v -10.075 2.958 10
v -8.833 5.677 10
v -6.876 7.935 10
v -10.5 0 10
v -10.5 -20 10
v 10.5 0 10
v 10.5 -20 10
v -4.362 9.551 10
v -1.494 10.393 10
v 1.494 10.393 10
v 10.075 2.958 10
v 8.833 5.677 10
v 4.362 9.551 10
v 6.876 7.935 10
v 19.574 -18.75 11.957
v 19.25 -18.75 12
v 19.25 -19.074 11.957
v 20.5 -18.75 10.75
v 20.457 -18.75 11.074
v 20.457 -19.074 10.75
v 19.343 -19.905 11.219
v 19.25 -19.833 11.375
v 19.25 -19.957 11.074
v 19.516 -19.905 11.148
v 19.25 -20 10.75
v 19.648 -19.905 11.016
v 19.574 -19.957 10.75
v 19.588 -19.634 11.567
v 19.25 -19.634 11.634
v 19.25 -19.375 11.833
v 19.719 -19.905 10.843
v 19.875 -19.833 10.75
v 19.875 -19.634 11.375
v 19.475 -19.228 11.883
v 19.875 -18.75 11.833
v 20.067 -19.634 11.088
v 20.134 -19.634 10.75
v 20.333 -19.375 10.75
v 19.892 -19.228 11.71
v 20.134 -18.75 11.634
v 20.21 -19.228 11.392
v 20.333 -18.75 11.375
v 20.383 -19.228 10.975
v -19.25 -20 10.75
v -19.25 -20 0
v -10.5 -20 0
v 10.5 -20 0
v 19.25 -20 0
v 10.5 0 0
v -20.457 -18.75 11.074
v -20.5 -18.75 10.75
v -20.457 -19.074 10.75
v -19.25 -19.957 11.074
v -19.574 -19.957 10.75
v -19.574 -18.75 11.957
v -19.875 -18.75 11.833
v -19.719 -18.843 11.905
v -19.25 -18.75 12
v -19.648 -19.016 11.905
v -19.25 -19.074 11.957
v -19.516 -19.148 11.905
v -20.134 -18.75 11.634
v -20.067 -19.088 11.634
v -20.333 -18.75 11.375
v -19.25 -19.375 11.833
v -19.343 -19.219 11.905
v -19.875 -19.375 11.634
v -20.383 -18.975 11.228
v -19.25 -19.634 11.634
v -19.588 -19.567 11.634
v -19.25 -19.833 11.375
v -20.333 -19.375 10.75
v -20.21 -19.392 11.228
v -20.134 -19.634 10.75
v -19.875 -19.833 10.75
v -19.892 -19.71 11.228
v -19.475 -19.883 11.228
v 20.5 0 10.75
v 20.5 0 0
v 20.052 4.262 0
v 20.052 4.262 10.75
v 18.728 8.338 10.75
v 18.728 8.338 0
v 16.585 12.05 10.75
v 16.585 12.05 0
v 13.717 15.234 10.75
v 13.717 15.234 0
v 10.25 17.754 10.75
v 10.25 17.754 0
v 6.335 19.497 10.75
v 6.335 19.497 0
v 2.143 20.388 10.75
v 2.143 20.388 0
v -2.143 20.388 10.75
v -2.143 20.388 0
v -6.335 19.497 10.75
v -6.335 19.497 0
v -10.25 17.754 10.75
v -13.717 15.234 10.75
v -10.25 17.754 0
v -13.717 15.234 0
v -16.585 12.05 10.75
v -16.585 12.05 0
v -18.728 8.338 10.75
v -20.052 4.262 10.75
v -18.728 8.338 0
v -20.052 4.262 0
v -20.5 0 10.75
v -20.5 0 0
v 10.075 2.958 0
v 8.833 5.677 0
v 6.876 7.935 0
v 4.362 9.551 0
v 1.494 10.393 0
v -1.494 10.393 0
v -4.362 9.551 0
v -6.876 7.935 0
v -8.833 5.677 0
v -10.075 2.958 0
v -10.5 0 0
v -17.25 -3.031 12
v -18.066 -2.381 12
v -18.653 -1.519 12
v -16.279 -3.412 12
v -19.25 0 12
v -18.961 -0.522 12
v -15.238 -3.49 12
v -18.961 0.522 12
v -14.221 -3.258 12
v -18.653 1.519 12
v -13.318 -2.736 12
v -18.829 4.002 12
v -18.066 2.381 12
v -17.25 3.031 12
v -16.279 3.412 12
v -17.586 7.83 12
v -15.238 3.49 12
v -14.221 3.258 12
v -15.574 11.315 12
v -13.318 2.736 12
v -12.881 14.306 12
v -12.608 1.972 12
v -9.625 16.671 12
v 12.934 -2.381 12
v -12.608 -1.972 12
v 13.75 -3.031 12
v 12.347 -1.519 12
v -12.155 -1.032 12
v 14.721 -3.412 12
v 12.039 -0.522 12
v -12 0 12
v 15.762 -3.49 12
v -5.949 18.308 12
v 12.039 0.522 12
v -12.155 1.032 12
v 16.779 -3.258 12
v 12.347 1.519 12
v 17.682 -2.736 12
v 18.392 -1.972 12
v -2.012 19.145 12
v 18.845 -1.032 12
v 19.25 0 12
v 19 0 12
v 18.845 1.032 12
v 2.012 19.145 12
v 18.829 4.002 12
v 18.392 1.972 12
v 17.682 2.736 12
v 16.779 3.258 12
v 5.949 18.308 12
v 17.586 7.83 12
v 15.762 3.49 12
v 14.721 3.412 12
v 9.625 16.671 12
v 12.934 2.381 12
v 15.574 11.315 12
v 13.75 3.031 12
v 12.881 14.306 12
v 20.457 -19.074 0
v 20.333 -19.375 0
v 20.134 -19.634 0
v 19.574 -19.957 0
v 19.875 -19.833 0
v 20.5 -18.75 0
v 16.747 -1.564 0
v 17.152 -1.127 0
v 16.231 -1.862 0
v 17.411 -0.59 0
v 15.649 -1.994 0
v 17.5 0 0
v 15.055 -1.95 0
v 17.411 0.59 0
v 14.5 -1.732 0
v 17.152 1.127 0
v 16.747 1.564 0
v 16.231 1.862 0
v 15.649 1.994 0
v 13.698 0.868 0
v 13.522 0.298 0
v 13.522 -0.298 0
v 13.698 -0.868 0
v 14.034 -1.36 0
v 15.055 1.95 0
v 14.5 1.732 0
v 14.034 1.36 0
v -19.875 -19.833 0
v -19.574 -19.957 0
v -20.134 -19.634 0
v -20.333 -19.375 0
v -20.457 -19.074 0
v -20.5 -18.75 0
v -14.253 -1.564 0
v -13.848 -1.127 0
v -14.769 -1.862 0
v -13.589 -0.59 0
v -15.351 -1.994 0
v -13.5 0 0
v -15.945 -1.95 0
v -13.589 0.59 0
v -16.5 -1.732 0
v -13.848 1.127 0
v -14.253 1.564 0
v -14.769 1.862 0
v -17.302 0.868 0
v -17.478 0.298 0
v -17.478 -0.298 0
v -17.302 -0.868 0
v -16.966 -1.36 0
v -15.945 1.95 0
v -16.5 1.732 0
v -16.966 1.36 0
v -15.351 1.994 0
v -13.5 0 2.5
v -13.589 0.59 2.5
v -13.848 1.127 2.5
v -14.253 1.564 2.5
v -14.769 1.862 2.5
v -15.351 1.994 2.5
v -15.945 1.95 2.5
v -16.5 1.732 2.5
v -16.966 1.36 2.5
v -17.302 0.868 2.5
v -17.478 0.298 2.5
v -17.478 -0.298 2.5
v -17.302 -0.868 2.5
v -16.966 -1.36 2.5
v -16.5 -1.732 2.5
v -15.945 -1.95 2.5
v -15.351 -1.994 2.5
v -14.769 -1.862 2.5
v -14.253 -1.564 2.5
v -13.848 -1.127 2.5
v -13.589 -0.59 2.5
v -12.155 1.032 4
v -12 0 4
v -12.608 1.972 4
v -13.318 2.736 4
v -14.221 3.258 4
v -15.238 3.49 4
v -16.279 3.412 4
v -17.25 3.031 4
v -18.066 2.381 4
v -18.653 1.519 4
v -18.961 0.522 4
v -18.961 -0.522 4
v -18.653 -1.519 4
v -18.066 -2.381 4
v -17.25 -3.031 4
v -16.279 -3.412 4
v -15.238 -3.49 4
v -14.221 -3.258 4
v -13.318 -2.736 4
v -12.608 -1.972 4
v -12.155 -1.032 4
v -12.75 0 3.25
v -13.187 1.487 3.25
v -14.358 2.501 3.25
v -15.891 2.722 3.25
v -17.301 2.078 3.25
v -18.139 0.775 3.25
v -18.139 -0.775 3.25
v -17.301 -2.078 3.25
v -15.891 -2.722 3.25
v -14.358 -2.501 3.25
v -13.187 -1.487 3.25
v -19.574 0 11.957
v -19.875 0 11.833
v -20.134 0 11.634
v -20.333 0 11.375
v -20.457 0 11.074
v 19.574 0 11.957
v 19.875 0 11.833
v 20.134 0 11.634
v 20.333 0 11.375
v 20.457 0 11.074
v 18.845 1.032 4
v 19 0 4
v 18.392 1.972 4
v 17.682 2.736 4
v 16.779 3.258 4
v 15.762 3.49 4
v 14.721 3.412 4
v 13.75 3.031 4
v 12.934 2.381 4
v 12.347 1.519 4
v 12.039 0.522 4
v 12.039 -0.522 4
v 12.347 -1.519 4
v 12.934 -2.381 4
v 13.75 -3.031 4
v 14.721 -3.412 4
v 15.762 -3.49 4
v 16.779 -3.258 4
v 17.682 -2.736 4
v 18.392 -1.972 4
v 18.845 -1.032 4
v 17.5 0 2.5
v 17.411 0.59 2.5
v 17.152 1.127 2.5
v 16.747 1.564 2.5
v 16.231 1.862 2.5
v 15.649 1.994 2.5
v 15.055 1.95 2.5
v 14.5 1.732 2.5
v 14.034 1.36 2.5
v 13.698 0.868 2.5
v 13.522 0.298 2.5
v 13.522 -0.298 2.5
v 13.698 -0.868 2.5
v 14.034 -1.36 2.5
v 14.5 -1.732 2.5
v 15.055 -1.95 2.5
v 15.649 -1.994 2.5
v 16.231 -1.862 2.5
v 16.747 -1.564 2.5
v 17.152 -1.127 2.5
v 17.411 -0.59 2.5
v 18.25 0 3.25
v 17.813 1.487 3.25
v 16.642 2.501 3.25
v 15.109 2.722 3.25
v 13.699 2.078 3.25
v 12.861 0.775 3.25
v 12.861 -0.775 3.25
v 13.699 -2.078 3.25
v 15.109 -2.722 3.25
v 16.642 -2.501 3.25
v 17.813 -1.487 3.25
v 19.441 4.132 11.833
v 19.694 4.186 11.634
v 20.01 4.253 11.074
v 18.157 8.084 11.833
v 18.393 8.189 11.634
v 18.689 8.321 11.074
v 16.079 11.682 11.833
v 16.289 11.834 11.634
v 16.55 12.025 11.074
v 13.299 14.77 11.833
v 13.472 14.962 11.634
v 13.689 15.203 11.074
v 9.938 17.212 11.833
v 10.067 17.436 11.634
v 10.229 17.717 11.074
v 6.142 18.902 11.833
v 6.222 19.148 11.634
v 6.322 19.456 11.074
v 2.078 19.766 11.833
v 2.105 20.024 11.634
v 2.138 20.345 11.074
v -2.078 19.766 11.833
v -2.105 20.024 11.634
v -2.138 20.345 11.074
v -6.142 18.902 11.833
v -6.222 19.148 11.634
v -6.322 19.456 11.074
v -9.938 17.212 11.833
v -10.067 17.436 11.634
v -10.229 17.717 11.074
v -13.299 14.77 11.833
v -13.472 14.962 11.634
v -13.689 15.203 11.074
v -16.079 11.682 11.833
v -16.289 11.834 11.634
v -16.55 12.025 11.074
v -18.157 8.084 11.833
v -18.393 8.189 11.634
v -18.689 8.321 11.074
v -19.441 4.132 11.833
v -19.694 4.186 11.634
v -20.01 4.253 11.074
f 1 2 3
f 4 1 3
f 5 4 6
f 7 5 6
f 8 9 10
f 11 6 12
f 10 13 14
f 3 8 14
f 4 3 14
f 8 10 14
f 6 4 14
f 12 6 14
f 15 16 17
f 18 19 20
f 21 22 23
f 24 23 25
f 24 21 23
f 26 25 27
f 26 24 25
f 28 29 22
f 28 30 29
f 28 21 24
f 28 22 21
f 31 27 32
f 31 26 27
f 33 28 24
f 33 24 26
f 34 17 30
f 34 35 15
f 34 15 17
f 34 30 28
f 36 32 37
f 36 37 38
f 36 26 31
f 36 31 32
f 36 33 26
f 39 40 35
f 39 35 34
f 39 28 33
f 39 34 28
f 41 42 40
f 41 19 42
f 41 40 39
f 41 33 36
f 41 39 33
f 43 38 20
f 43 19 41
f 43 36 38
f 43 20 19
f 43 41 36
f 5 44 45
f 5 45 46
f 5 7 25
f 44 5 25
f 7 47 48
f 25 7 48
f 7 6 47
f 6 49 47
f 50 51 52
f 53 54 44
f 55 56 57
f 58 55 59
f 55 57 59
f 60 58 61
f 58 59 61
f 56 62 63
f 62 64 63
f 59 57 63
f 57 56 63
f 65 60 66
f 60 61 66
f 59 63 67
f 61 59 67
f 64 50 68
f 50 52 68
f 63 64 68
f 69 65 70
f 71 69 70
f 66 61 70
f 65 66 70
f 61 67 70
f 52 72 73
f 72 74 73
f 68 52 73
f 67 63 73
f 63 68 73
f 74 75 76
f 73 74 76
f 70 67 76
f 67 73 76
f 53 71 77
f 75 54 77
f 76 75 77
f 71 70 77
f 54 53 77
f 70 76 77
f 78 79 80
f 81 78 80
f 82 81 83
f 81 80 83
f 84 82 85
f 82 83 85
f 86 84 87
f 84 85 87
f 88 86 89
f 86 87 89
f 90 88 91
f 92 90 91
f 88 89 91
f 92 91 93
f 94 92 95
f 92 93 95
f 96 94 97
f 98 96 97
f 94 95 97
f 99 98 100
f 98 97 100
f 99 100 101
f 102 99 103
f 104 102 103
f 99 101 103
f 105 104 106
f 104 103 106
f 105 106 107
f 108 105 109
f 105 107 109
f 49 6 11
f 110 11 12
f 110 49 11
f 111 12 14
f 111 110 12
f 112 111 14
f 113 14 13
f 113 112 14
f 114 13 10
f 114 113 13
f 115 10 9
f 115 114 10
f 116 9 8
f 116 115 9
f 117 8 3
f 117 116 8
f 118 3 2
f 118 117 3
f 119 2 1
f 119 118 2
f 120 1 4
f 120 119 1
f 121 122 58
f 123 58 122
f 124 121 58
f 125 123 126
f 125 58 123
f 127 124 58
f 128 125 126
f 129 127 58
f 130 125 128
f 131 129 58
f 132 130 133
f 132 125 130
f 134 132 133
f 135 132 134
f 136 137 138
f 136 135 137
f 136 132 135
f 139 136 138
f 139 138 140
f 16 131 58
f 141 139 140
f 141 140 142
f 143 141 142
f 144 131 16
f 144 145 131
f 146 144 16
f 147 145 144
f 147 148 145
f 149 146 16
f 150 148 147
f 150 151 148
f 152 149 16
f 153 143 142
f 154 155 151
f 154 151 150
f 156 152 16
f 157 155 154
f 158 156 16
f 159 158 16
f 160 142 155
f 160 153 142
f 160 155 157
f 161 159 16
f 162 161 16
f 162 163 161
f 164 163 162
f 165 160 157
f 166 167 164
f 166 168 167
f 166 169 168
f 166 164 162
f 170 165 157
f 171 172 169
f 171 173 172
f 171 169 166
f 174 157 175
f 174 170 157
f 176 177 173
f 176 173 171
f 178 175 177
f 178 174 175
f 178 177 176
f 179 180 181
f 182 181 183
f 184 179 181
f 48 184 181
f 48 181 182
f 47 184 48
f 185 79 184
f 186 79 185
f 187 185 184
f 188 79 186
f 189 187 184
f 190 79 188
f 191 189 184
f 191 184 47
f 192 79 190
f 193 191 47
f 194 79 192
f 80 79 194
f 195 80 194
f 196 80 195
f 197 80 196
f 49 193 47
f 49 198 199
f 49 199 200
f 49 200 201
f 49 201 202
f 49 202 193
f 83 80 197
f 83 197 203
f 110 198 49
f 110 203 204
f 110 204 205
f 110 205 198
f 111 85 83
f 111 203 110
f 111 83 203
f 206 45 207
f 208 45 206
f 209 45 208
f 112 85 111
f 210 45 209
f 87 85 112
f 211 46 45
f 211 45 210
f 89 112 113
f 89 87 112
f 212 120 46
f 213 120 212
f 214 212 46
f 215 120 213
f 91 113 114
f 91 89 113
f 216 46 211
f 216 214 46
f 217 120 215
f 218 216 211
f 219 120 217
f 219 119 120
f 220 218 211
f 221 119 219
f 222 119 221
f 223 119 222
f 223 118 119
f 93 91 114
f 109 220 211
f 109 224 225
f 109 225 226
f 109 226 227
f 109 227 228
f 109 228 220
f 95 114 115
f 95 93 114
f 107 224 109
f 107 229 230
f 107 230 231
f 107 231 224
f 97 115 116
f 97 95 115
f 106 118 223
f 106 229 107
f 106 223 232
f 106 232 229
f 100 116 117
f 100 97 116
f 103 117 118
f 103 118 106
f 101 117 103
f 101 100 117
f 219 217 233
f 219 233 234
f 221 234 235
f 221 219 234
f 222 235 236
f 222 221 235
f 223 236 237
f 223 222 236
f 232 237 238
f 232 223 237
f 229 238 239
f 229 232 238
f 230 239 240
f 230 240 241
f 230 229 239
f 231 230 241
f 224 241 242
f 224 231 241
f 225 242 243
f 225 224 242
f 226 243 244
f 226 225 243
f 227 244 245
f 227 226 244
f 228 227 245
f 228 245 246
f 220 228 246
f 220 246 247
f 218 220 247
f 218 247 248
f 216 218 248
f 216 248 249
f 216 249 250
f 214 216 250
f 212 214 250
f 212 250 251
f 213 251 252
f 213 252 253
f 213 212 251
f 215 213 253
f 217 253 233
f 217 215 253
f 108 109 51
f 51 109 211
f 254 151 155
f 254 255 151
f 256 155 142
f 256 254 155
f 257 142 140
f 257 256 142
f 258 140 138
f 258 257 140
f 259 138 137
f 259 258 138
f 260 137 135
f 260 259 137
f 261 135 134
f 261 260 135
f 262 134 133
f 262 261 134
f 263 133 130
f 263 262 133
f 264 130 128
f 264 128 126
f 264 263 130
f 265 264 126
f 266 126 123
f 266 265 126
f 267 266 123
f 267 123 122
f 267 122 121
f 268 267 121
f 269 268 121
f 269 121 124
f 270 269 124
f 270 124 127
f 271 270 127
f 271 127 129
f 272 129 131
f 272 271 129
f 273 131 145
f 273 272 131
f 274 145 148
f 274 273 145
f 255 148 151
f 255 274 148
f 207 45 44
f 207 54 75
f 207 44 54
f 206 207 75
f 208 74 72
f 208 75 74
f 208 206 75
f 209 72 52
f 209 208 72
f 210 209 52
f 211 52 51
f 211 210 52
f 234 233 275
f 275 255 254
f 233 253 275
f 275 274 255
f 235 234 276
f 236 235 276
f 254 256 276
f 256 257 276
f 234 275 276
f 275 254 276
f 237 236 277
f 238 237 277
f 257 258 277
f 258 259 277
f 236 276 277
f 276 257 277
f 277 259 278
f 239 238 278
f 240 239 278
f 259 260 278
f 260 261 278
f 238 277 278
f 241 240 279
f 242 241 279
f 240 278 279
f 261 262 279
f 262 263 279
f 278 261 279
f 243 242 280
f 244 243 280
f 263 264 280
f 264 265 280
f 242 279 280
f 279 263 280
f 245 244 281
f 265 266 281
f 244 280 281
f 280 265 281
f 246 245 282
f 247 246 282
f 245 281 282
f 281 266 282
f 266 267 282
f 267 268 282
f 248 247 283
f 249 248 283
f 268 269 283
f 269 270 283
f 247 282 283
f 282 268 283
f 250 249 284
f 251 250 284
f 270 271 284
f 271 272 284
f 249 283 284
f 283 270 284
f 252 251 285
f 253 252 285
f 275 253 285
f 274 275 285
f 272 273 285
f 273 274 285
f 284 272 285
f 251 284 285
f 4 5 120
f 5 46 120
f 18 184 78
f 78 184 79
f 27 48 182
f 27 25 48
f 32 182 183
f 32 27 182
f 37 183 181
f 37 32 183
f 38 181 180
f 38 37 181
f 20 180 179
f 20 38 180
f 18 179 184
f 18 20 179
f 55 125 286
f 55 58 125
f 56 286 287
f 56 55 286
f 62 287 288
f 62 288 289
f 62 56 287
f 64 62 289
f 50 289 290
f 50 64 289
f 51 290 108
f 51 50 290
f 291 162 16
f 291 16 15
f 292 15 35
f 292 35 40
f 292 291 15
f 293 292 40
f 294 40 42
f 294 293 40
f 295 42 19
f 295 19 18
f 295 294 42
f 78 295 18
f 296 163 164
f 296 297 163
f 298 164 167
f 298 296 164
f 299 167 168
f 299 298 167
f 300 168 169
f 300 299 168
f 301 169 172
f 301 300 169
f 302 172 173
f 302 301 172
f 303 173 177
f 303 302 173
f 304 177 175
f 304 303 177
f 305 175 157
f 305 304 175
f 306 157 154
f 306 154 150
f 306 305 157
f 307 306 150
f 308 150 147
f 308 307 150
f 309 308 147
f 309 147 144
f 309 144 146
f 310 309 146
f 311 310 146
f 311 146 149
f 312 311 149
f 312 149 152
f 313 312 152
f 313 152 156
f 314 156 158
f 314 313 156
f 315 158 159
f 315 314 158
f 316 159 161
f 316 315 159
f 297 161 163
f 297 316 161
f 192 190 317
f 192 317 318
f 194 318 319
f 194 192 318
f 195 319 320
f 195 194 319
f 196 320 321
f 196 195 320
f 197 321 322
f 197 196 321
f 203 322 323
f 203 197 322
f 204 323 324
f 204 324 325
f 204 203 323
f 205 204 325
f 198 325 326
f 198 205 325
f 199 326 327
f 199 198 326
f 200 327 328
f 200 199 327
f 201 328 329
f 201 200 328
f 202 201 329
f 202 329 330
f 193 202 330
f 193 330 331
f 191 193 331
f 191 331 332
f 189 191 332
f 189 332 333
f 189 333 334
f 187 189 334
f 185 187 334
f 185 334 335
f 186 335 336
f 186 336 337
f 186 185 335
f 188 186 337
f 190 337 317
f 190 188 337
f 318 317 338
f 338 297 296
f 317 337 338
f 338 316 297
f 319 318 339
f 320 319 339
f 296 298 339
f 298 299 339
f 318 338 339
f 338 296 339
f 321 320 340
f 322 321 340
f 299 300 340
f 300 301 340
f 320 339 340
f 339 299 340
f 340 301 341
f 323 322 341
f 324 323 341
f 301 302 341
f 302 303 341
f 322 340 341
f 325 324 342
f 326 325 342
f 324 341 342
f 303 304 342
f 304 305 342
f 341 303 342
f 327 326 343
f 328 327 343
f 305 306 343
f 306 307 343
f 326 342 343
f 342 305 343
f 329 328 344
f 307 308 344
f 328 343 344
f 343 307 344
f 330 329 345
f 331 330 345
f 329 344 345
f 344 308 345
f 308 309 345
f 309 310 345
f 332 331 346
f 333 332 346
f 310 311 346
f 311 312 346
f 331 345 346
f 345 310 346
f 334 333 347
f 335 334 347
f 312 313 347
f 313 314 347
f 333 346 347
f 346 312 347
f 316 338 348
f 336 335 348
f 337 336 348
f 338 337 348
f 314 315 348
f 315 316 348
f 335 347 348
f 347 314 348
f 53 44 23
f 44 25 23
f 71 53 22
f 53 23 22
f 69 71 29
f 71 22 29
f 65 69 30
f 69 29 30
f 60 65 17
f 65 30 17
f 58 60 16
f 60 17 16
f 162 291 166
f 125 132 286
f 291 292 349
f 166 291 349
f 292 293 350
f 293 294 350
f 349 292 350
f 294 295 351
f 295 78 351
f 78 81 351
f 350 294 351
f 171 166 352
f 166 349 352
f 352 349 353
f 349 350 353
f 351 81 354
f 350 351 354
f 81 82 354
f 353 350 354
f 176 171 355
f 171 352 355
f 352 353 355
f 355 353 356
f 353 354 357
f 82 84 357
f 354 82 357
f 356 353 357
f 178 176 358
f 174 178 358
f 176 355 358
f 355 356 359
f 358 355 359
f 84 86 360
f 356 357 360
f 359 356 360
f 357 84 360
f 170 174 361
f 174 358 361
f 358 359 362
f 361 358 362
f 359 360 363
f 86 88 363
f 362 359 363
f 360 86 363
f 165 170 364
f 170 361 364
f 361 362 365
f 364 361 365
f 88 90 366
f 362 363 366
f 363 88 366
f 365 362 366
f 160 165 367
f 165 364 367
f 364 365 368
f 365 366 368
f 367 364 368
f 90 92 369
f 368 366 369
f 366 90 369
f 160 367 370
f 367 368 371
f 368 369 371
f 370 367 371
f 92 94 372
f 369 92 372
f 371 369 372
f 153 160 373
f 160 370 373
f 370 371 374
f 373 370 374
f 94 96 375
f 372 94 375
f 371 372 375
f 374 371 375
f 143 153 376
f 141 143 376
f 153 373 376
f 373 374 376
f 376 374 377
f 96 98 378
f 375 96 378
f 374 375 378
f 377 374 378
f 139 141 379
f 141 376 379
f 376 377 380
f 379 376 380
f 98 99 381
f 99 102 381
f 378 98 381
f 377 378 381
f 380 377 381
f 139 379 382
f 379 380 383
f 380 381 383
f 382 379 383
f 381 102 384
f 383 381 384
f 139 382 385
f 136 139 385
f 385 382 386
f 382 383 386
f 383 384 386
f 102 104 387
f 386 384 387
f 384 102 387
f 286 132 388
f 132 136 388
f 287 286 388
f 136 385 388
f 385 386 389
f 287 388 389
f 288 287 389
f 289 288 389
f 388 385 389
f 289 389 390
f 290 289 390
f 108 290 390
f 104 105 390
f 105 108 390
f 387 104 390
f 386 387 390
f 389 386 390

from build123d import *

# Parameters (mm, degrees)
SKETCH_R     = 2
PAD_DEPTH    = 4
CHAMFER_SIZE = 1.5
SKETCH001_R  = 3.5
PAD001_DEPTH = 6
SKETCH002_R  = 3.5
PAD002_DEPTH = 2
FILLET_R     = 1.25


with BuildPart() as part:
    # Sketch → Pad (new body)
    with BuildSketch(Plane.XY):
        with BuildLine():
            Line((-10.5, 0), (-10.5, -20))
            Line((-10.5, -20), (-20.5, -20))
            Line((-20.5, -20), (-20.5, 0))
            ThreePointArc((20.5, 0), (0, 20.5), (-20.5, 0))
            Line((20.5, 0), (20.5, -20))
            Line((20.5, -20), (10.5, -20))
            Line((10.5, -20), (10.5, 0))
            ThreePointArc((10.5, 0), (0, 10.5), (-10.5, 0))
        make_face()
        with Locations((-15.5, 0)):
            Circle(SKETCH_R, mode=Mode.SUBTRACT)
        with Locations((15.5, 0)):
            Circle(SKETCH_R, mode=Mode.SUBTRACT)
    extrude(amount=PAD_DEPTH)

    # Chamfer
    chamfer_edges = [part.edges().sort_by_distance(p)[0] for p in [
        (13.5, 0, 4),
        (-17.5, 0, 4),
    ]]
    chamfer(chamfer_edges, length=CHAMFER_SIZE)

    # Sketch001 (on Face4 of Chamfer) → Pad001 (join)
    with BuildSketch(Plane.XY.offset(4)):
        with BuildLine():
            Line((-10.5, -20), (-20.5, -20))
            Line((-20.5, -20), (-20.5, 0))
            ThreePointArc((20.5, 0), (0, 20.5), (-20.5, 0))
            Line((20.5, -20), (20.5, 0))
            Line((10.5, -20), (20.5, -20))
            Line((10.5, 0), (10.5, -20))
            ThreePointArc((10.5, 0), (0, 10.5), (-10.5, 0))
            Line((-10.5, -20), (-10.5, 0))
        make_face()
        with Locations((-15.5, 0)):
            Circle(SKETCH001_R, mode=Mode.SUBTRACT)
        with Locations((15.5, 0)):
            Circle(SKETCH001_R, mode=Mode.SUBTRACT)
    extrude(amount=PAD001_DEPTH)

    # Sketch002 (on Face14 of Pad001) → Pad002 (join)
    with BuildSketch(Plane.XY.offset(10)):
        with BuildLine():
            Line((-20.5, -20), (20.5, -20))
            Line((20.5, -20), (20.5, 0))
            ThreePointArc((20.5, 0), (0, 20.5), (-20.5, 0))
            Line((-20.5, 0), (-20.5, -20))
        make_face()
        with Locations((-15.5, 0)):
            Circle(SKETCH002_R, mode=Mode.SUBTRACT)
        with Locations((15.5, 0)):
            Circle(SKETCH002_R, mode=Mode.SUBTRACT)
    extrude(amount=PAD002_DEPTH)

    # Fillet
    fillet_edges = [part.edges().sort_by_distance(p)[0] for p in [
        (-20.5, -20, 2),
        (-20.5, -20, 7),
        (-20.5, -20, 11),
        (-20.5, -10, 12),
        (0, 20.5, 12),
        (0, -20, 12),
        (20.5, -10, 12),
        (20.5, -20, 11),
        (20.5, -20, 7),
        (20.5, -20, 2),
    ]]
    fillet(fillet_edges, radius=FILLET_R)


solid = part.part
